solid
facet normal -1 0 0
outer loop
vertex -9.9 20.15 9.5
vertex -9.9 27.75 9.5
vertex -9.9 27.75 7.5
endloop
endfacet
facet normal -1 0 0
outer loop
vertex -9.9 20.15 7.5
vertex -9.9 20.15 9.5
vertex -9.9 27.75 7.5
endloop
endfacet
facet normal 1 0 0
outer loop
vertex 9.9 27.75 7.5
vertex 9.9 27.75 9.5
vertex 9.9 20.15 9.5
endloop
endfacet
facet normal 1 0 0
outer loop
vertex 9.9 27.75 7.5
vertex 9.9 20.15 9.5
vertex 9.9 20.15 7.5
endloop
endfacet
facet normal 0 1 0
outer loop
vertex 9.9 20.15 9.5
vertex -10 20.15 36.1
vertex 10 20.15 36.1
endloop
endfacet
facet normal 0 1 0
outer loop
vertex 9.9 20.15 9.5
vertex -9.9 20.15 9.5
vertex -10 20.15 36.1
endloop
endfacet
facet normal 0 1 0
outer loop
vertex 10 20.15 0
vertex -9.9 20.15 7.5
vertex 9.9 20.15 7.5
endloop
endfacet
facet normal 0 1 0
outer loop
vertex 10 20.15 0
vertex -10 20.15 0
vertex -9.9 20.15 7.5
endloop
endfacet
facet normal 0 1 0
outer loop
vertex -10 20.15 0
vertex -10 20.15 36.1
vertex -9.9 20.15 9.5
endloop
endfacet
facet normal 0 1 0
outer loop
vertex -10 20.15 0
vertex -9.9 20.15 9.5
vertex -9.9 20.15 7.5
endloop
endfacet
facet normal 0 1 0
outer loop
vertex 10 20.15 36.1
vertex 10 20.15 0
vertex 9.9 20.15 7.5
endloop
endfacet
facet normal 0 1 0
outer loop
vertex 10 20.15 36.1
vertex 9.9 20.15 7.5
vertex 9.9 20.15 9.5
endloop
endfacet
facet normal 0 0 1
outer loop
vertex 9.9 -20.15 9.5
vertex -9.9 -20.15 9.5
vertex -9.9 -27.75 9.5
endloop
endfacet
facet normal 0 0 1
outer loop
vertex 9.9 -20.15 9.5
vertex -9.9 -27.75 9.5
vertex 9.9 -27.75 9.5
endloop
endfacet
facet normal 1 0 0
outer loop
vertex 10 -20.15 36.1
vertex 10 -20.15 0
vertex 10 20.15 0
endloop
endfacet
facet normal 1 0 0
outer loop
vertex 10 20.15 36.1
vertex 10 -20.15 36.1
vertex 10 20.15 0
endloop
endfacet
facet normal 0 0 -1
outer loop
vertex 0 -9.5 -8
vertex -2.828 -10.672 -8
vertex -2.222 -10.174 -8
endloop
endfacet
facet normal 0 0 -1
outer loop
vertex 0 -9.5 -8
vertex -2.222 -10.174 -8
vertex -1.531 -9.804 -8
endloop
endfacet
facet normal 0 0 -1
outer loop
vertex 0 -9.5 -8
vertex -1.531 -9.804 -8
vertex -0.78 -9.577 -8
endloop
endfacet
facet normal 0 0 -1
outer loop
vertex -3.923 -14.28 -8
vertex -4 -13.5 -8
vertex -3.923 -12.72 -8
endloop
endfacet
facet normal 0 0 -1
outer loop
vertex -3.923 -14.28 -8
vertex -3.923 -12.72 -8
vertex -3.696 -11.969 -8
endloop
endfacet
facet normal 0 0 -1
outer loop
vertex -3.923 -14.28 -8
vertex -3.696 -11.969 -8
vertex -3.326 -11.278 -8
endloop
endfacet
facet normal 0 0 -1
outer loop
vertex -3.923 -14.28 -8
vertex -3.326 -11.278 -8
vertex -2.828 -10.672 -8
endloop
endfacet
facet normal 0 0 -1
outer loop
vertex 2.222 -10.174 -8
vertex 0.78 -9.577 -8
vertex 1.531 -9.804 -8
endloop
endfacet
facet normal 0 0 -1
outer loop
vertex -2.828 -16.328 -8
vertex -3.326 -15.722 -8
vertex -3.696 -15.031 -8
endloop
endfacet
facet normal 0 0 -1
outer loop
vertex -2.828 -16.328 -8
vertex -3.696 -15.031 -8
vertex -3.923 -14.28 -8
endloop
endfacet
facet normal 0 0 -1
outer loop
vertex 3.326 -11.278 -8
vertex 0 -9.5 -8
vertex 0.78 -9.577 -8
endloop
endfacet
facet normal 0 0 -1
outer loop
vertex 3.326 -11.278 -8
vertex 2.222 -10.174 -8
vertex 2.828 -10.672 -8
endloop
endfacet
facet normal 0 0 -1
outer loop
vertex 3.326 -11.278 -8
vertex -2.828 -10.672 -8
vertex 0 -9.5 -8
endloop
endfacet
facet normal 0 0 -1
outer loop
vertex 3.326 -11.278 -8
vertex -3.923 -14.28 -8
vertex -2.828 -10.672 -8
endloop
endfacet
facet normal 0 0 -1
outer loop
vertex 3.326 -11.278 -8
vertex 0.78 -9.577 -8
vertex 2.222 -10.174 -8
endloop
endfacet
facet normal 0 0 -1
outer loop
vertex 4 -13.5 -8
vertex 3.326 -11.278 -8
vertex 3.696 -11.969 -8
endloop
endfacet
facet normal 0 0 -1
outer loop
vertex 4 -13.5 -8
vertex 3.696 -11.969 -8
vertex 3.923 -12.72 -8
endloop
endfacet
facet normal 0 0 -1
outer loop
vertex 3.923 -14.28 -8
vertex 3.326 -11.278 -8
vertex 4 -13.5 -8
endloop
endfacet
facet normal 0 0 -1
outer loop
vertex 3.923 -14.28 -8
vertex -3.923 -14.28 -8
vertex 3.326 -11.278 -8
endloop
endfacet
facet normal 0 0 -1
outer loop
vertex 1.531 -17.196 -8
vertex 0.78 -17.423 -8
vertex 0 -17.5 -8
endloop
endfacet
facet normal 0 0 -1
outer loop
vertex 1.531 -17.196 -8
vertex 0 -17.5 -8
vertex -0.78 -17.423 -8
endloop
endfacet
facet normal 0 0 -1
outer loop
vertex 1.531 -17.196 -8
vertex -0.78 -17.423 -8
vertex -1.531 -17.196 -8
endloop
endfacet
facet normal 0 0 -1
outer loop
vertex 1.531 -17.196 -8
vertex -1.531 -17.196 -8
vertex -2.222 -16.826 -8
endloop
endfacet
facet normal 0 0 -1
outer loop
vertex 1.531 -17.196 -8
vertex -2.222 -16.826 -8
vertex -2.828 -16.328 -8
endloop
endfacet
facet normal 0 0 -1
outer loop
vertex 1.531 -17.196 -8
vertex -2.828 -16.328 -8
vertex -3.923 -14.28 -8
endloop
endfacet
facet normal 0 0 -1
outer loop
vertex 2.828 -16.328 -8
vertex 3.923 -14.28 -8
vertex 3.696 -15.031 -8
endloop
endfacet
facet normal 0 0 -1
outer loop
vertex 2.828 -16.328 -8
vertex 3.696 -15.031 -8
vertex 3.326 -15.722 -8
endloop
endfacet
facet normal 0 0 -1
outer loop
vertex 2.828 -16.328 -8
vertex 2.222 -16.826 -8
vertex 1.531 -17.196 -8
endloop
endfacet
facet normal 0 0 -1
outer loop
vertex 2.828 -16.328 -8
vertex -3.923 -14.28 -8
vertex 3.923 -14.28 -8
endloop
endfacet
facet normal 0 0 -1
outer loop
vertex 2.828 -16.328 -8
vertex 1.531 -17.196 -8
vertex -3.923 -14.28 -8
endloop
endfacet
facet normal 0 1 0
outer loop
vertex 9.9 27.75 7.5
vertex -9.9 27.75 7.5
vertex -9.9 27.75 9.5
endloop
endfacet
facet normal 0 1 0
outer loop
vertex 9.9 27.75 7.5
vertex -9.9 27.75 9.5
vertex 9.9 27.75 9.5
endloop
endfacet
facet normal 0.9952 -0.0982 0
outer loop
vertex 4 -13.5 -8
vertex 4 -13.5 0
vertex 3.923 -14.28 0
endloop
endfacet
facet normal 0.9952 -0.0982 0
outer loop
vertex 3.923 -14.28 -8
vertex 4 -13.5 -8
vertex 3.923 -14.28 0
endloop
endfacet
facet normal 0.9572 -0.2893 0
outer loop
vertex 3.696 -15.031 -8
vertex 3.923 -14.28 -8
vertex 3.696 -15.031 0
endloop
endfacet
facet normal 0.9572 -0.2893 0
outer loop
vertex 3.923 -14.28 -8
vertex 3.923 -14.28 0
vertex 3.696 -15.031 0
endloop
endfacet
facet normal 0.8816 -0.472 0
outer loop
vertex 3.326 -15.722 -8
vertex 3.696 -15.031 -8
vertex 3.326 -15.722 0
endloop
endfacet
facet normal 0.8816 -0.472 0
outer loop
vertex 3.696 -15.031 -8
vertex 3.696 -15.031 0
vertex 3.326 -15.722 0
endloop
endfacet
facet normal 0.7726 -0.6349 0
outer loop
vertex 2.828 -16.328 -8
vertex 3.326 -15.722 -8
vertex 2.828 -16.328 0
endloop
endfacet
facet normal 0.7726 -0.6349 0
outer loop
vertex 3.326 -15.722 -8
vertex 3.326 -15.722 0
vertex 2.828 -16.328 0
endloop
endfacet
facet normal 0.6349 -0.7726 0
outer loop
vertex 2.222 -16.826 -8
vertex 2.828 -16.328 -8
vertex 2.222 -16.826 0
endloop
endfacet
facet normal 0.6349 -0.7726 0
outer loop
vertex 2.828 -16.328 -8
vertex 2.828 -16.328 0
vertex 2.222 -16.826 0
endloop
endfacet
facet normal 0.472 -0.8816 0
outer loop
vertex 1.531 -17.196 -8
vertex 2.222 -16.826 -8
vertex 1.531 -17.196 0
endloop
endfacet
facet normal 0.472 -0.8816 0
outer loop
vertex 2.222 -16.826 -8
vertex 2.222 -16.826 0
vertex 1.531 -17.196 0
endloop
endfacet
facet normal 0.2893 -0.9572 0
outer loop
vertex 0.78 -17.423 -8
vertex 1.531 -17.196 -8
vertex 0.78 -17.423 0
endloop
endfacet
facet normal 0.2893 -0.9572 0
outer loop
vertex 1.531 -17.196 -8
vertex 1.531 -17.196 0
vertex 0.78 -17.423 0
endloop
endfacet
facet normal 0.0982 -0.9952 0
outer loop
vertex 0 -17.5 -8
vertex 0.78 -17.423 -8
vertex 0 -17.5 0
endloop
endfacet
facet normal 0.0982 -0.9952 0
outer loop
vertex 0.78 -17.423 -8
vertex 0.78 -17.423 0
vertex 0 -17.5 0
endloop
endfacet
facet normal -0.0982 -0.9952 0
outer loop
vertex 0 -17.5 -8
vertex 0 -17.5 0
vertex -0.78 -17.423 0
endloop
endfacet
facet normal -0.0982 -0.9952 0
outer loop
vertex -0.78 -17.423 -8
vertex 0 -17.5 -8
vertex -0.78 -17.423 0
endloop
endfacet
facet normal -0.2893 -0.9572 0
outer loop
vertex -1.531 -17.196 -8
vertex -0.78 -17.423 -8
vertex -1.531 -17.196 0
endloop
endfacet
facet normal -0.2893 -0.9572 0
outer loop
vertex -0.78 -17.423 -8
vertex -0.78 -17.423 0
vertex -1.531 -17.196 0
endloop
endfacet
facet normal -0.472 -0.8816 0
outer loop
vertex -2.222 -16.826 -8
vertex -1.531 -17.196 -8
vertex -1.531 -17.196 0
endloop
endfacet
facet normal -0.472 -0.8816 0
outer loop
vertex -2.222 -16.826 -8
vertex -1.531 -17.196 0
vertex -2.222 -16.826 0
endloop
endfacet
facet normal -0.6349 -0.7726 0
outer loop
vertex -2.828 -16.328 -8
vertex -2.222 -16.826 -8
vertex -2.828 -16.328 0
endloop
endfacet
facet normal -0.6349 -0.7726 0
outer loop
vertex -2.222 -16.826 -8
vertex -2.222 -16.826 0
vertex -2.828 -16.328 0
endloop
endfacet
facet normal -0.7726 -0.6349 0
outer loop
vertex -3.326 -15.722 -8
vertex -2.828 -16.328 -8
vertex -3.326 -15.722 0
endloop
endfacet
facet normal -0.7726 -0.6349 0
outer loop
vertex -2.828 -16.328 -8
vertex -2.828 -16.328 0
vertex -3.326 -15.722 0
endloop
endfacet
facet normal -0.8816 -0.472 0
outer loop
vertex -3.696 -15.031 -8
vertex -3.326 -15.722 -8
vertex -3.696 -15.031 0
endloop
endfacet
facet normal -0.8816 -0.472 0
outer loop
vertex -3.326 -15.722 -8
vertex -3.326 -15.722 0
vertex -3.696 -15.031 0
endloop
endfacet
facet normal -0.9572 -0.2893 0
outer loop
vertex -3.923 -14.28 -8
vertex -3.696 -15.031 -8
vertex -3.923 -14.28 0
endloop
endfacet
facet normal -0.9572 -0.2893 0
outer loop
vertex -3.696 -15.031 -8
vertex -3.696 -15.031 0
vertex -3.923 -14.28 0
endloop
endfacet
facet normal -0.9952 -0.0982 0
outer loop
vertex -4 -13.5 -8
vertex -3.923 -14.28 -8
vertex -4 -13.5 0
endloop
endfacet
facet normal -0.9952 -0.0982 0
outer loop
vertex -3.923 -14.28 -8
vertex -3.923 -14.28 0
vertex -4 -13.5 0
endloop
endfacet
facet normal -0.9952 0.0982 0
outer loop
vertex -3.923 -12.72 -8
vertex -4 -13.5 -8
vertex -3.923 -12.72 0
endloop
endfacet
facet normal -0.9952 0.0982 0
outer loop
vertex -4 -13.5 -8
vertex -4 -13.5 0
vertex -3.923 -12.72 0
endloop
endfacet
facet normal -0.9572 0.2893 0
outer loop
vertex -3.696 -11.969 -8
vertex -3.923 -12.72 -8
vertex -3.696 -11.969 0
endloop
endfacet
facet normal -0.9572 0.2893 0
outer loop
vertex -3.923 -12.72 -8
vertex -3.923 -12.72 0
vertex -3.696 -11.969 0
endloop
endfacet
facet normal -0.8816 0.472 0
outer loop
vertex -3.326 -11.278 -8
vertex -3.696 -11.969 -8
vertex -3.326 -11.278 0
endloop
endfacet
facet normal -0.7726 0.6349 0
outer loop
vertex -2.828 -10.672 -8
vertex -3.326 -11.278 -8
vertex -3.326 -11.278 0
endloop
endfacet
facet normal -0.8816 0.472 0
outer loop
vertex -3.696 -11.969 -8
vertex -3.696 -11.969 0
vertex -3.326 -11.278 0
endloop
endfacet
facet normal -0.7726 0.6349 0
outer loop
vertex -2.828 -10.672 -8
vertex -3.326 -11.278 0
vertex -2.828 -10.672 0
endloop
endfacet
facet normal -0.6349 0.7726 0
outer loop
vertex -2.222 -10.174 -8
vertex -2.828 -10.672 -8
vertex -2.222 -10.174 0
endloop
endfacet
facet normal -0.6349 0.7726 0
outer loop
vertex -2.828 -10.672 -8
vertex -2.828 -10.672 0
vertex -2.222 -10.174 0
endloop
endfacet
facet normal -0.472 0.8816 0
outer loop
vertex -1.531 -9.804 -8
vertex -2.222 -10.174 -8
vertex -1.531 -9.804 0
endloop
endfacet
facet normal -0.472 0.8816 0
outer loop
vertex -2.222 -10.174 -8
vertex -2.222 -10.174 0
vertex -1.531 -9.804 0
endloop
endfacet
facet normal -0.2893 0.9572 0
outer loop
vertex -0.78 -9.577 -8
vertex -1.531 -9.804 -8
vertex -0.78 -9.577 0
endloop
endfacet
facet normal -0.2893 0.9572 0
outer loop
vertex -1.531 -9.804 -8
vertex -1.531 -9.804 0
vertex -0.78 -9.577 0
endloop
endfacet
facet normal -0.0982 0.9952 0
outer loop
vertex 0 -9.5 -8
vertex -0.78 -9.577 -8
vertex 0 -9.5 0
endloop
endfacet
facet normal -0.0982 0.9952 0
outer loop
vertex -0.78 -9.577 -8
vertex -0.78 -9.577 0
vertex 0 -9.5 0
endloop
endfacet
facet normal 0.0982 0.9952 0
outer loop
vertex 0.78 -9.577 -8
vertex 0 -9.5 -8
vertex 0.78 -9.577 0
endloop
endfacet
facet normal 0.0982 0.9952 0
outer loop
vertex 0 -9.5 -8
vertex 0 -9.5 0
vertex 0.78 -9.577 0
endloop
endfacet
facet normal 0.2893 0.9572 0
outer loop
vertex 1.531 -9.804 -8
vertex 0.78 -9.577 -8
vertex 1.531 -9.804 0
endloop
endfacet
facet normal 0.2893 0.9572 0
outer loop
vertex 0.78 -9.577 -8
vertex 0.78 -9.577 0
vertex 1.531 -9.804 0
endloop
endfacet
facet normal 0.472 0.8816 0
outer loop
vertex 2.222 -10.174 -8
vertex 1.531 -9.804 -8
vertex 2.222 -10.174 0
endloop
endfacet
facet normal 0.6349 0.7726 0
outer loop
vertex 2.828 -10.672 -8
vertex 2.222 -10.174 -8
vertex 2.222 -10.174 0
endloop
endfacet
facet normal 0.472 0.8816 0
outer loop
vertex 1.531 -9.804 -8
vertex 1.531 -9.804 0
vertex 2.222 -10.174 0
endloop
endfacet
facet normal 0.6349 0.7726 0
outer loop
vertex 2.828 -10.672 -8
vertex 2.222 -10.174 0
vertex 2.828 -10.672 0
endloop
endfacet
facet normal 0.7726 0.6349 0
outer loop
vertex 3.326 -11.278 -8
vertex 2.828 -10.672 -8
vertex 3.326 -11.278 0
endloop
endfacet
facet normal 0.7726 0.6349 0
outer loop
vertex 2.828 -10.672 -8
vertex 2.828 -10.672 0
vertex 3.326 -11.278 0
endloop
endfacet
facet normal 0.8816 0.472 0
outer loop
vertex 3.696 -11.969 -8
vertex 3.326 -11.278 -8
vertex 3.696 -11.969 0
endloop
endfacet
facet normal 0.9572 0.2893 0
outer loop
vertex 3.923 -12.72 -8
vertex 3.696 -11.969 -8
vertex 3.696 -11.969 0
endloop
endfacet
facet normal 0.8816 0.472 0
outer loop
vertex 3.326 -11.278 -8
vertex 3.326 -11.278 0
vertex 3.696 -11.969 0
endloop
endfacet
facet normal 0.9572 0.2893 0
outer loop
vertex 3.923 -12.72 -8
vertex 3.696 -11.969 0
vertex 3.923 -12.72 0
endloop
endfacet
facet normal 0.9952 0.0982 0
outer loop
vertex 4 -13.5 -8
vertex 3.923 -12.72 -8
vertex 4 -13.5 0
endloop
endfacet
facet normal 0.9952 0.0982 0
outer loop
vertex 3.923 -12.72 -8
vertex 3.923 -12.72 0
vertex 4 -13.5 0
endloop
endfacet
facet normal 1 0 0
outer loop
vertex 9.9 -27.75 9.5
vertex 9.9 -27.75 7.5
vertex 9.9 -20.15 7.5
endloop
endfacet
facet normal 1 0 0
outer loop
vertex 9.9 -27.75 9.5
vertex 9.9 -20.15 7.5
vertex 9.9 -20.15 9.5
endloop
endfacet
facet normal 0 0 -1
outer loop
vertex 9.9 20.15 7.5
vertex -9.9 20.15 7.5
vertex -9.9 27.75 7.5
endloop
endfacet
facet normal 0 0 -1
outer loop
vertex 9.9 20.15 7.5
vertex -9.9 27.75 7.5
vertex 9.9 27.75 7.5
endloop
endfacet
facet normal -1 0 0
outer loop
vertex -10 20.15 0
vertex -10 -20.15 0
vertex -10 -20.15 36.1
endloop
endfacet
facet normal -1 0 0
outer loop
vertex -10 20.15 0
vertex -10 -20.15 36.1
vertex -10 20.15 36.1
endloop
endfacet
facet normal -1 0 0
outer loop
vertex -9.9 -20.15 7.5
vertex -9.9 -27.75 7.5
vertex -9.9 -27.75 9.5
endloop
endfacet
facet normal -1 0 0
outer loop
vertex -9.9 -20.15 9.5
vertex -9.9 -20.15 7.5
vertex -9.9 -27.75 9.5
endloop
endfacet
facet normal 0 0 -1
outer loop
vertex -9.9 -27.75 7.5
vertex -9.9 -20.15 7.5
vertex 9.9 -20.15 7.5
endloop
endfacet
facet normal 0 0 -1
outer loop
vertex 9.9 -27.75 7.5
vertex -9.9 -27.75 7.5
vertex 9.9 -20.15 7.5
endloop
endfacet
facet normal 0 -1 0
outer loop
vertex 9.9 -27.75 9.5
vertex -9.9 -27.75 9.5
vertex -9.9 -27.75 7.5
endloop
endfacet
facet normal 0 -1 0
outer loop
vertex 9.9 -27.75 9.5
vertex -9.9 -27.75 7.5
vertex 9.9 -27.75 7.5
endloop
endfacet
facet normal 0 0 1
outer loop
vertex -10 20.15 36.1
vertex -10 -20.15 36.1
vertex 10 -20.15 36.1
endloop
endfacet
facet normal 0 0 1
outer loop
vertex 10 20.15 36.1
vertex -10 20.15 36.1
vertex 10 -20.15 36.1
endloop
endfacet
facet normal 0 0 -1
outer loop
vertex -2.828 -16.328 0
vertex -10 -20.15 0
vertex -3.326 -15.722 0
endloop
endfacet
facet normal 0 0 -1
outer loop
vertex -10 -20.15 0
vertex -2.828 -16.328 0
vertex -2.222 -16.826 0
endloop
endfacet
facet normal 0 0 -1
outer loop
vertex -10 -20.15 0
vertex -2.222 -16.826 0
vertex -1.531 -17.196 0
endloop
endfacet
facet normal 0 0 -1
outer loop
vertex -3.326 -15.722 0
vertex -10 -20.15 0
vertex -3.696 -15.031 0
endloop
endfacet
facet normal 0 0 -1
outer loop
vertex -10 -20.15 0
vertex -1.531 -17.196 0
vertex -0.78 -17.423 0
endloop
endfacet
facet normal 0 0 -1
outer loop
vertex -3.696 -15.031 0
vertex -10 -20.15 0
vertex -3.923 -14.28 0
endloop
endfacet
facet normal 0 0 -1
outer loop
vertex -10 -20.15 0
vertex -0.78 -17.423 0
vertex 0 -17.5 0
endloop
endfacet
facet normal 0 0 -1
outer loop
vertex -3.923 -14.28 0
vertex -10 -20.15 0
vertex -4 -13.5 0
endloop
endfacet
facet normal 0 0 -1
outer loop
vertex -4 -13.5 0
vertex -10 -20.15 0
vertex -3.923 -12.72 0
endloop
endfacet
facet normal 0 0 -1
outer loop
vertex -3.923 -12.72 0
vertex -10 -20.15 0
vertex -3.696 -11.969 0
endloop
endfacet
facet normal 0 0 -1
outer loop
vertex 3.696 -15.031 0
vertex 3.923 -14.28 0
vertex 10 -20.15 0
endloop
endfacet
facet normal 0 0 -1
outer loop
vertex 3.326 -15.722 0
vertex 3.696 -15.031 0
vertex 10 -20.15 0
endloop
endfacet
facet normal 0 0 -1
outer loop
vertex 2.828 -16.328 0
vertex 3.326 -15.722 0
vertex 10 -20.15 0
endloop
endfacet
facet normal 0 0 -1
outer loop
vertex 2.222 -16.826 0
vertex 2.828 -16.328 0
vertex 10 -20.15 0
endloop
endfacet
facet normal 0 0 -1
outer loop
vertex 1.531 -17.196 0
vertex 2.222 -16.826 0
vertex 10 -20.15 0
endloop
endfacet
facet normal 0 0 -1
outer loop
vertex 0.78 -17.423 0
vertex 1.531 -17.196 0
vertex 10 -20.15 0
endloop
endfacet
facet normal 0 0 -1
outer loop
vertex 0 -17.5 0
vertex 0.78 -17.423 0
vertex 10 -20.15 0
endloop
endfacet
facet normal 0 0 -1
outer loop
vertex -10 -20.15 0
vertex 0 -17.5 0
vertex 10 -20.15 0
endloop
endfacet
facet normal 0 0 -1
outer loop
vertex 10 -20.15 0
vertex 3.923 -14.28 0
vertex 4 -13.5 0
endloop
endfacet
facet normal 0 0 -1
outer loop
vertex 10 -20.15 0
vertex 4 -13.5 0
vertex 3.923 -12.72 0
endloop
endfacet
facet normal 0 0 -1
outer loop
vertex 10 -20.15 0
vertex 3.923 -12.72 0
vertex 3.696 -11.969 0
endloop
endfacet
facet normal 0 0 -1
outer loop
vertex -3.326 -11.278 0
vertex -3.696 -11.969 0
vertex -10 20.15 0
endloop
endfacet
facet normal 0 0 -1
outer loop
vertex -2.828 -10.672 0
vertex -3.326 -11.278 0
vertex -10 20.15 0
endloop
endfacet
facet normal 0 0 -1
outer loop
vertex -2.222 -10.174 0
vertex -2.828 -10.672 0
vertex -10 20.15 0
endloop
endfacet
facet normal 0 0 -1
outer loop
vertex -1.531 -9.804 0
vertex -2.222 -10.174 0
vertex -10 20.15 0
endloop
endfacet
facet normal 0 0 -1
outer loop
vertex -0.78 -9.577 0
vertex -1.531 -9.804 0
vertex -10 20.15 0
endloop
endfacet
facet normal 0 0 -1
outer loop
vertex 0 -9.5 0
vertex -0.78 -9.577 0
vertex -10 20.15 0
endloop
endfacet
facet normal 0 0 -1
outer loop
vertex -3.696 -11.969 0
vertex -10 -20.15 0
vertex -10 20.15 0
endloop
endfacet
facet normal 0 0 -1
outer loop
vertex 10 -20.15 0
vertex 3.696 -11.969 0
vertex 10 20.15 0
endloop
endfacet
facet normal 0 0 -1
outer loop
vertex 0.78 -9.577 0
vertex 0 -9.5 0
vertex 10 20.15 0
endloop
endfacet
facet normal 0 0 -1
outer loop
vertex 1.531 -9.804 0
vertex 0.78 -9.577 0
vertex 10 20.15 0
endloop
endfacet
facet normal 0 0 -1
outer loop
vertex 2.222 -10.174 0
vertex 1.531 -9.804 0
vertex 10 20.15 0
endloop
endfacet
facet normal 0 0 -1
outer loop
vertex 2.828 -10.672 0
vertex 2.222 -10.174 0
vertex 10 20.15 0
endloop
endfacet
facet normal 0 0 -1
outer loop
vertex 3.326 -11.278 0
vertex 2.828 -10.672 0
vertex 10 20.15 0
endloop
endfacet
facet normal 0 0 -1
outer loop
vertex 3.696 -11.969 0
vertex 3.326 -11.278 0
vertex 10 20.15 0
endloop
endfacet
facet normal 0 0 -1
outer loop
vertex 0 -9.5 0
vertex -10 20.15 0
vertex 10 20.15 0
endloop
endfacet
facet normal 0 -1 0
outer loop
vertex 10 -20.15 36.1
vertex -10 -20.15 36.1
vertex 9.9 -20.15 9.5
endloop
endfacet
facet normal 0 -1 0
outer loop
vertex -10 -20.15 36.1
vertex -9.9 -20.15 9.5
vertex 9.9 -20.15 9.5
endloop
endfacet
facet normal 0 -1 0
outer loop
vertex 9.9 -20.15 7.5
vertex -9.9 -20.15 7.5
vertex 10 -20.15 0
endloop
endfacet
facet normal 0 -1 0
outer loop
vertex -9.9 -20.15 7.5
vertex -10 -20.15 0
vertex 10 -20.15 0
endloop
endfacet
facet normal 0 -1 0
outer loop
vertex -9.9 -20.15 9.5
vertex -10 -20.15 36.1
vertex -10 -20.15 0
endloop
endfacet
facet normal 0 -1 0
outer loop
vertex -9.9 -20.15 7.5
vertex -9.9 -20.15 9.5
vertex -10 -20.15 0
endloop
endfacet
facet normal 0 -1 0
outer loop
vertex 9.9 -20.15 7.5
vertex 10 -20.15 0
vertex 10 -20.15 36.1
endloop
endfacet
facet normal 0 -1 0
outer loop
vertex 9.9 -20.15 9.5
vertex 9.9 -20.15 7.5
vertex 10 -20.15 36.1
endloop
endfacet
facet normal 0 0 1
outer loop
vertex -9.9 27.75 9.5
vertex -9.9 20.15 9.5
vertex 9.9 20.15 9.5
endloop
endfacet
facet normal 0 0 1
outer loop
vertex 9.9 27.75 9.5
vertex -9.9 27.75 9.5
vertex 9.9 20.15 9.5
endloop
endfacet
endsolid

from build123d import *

# Parameters (mm, degrees)
ESQUISSE1_W        = 20
ESQUISSE1_H        = 40.3
BOSS_EXTRU_1_DEPTH = 36.1
ESQUISSE3_W        = 19.8
ESQUISSE3_H        = 2
BOSS_EXTRU_3_DEPTH = 7.6
ESQUISSE5_W        = 19.8
ESQUISSE5_H        = 2
BOSS_EXTRU_4_DEPTH = 7.6
ESQUISSE6_R        = 4
BOSS_EXTRU_5_DEPTH = 8


with BuildPart() as part:
    # Esquisse1 → Boss.-Extru.1 (new body)
    with BuildSketch(Plane.XY):
        Rectangle(ESQUISSE1_W, ESQUISSE1_H)
    extrude(amount=BOSS_EXTRU_1_DEPTH)

    # Esquisse3 → Boss.-Extru.3 (add)
    with BuildSketch(Plane(origin=(-10, -20.15, 0), x_dir=(1, 0, 0), z_dir=(0, -1, 0))):
        with Locations((10, 8.5)):
            Rectangle(ESQUISSE3_W, ESQUISSE3_H)
    extrude(amount=BOSS_EXTRU_3_DEPTH)

    # Esquisse5 → Boss.-Extru.4 (add)
    with BuildSketch(Plane(origin=(0, 20.15, 0), x_dir=(1, 0, 0), z_dir=(0, 1, 0))):
        with Locations((0, -8.5)):
            Rectangle(ESQUISSE5_W, ESQUISSE5_H)
    extrude(amount=BOSS_EXTRU_4_DEPTH)

    # Esquisse6 → Boss.-Extru.5 (add)
    with BuildSketch(Plane(origin=(0, 0, 0), x_dir=(-1, 0, 0), z_dir=(0, 0, -1))):
        with Locations(Location((0, -13.5, 0), (0, 0, 180))):  # turned: the seam where the file's is
            Circle(ESQUISSE6_R)
    extrude(amount=BOSS_EXTRU_5_DEPTH)


solid = part.part
